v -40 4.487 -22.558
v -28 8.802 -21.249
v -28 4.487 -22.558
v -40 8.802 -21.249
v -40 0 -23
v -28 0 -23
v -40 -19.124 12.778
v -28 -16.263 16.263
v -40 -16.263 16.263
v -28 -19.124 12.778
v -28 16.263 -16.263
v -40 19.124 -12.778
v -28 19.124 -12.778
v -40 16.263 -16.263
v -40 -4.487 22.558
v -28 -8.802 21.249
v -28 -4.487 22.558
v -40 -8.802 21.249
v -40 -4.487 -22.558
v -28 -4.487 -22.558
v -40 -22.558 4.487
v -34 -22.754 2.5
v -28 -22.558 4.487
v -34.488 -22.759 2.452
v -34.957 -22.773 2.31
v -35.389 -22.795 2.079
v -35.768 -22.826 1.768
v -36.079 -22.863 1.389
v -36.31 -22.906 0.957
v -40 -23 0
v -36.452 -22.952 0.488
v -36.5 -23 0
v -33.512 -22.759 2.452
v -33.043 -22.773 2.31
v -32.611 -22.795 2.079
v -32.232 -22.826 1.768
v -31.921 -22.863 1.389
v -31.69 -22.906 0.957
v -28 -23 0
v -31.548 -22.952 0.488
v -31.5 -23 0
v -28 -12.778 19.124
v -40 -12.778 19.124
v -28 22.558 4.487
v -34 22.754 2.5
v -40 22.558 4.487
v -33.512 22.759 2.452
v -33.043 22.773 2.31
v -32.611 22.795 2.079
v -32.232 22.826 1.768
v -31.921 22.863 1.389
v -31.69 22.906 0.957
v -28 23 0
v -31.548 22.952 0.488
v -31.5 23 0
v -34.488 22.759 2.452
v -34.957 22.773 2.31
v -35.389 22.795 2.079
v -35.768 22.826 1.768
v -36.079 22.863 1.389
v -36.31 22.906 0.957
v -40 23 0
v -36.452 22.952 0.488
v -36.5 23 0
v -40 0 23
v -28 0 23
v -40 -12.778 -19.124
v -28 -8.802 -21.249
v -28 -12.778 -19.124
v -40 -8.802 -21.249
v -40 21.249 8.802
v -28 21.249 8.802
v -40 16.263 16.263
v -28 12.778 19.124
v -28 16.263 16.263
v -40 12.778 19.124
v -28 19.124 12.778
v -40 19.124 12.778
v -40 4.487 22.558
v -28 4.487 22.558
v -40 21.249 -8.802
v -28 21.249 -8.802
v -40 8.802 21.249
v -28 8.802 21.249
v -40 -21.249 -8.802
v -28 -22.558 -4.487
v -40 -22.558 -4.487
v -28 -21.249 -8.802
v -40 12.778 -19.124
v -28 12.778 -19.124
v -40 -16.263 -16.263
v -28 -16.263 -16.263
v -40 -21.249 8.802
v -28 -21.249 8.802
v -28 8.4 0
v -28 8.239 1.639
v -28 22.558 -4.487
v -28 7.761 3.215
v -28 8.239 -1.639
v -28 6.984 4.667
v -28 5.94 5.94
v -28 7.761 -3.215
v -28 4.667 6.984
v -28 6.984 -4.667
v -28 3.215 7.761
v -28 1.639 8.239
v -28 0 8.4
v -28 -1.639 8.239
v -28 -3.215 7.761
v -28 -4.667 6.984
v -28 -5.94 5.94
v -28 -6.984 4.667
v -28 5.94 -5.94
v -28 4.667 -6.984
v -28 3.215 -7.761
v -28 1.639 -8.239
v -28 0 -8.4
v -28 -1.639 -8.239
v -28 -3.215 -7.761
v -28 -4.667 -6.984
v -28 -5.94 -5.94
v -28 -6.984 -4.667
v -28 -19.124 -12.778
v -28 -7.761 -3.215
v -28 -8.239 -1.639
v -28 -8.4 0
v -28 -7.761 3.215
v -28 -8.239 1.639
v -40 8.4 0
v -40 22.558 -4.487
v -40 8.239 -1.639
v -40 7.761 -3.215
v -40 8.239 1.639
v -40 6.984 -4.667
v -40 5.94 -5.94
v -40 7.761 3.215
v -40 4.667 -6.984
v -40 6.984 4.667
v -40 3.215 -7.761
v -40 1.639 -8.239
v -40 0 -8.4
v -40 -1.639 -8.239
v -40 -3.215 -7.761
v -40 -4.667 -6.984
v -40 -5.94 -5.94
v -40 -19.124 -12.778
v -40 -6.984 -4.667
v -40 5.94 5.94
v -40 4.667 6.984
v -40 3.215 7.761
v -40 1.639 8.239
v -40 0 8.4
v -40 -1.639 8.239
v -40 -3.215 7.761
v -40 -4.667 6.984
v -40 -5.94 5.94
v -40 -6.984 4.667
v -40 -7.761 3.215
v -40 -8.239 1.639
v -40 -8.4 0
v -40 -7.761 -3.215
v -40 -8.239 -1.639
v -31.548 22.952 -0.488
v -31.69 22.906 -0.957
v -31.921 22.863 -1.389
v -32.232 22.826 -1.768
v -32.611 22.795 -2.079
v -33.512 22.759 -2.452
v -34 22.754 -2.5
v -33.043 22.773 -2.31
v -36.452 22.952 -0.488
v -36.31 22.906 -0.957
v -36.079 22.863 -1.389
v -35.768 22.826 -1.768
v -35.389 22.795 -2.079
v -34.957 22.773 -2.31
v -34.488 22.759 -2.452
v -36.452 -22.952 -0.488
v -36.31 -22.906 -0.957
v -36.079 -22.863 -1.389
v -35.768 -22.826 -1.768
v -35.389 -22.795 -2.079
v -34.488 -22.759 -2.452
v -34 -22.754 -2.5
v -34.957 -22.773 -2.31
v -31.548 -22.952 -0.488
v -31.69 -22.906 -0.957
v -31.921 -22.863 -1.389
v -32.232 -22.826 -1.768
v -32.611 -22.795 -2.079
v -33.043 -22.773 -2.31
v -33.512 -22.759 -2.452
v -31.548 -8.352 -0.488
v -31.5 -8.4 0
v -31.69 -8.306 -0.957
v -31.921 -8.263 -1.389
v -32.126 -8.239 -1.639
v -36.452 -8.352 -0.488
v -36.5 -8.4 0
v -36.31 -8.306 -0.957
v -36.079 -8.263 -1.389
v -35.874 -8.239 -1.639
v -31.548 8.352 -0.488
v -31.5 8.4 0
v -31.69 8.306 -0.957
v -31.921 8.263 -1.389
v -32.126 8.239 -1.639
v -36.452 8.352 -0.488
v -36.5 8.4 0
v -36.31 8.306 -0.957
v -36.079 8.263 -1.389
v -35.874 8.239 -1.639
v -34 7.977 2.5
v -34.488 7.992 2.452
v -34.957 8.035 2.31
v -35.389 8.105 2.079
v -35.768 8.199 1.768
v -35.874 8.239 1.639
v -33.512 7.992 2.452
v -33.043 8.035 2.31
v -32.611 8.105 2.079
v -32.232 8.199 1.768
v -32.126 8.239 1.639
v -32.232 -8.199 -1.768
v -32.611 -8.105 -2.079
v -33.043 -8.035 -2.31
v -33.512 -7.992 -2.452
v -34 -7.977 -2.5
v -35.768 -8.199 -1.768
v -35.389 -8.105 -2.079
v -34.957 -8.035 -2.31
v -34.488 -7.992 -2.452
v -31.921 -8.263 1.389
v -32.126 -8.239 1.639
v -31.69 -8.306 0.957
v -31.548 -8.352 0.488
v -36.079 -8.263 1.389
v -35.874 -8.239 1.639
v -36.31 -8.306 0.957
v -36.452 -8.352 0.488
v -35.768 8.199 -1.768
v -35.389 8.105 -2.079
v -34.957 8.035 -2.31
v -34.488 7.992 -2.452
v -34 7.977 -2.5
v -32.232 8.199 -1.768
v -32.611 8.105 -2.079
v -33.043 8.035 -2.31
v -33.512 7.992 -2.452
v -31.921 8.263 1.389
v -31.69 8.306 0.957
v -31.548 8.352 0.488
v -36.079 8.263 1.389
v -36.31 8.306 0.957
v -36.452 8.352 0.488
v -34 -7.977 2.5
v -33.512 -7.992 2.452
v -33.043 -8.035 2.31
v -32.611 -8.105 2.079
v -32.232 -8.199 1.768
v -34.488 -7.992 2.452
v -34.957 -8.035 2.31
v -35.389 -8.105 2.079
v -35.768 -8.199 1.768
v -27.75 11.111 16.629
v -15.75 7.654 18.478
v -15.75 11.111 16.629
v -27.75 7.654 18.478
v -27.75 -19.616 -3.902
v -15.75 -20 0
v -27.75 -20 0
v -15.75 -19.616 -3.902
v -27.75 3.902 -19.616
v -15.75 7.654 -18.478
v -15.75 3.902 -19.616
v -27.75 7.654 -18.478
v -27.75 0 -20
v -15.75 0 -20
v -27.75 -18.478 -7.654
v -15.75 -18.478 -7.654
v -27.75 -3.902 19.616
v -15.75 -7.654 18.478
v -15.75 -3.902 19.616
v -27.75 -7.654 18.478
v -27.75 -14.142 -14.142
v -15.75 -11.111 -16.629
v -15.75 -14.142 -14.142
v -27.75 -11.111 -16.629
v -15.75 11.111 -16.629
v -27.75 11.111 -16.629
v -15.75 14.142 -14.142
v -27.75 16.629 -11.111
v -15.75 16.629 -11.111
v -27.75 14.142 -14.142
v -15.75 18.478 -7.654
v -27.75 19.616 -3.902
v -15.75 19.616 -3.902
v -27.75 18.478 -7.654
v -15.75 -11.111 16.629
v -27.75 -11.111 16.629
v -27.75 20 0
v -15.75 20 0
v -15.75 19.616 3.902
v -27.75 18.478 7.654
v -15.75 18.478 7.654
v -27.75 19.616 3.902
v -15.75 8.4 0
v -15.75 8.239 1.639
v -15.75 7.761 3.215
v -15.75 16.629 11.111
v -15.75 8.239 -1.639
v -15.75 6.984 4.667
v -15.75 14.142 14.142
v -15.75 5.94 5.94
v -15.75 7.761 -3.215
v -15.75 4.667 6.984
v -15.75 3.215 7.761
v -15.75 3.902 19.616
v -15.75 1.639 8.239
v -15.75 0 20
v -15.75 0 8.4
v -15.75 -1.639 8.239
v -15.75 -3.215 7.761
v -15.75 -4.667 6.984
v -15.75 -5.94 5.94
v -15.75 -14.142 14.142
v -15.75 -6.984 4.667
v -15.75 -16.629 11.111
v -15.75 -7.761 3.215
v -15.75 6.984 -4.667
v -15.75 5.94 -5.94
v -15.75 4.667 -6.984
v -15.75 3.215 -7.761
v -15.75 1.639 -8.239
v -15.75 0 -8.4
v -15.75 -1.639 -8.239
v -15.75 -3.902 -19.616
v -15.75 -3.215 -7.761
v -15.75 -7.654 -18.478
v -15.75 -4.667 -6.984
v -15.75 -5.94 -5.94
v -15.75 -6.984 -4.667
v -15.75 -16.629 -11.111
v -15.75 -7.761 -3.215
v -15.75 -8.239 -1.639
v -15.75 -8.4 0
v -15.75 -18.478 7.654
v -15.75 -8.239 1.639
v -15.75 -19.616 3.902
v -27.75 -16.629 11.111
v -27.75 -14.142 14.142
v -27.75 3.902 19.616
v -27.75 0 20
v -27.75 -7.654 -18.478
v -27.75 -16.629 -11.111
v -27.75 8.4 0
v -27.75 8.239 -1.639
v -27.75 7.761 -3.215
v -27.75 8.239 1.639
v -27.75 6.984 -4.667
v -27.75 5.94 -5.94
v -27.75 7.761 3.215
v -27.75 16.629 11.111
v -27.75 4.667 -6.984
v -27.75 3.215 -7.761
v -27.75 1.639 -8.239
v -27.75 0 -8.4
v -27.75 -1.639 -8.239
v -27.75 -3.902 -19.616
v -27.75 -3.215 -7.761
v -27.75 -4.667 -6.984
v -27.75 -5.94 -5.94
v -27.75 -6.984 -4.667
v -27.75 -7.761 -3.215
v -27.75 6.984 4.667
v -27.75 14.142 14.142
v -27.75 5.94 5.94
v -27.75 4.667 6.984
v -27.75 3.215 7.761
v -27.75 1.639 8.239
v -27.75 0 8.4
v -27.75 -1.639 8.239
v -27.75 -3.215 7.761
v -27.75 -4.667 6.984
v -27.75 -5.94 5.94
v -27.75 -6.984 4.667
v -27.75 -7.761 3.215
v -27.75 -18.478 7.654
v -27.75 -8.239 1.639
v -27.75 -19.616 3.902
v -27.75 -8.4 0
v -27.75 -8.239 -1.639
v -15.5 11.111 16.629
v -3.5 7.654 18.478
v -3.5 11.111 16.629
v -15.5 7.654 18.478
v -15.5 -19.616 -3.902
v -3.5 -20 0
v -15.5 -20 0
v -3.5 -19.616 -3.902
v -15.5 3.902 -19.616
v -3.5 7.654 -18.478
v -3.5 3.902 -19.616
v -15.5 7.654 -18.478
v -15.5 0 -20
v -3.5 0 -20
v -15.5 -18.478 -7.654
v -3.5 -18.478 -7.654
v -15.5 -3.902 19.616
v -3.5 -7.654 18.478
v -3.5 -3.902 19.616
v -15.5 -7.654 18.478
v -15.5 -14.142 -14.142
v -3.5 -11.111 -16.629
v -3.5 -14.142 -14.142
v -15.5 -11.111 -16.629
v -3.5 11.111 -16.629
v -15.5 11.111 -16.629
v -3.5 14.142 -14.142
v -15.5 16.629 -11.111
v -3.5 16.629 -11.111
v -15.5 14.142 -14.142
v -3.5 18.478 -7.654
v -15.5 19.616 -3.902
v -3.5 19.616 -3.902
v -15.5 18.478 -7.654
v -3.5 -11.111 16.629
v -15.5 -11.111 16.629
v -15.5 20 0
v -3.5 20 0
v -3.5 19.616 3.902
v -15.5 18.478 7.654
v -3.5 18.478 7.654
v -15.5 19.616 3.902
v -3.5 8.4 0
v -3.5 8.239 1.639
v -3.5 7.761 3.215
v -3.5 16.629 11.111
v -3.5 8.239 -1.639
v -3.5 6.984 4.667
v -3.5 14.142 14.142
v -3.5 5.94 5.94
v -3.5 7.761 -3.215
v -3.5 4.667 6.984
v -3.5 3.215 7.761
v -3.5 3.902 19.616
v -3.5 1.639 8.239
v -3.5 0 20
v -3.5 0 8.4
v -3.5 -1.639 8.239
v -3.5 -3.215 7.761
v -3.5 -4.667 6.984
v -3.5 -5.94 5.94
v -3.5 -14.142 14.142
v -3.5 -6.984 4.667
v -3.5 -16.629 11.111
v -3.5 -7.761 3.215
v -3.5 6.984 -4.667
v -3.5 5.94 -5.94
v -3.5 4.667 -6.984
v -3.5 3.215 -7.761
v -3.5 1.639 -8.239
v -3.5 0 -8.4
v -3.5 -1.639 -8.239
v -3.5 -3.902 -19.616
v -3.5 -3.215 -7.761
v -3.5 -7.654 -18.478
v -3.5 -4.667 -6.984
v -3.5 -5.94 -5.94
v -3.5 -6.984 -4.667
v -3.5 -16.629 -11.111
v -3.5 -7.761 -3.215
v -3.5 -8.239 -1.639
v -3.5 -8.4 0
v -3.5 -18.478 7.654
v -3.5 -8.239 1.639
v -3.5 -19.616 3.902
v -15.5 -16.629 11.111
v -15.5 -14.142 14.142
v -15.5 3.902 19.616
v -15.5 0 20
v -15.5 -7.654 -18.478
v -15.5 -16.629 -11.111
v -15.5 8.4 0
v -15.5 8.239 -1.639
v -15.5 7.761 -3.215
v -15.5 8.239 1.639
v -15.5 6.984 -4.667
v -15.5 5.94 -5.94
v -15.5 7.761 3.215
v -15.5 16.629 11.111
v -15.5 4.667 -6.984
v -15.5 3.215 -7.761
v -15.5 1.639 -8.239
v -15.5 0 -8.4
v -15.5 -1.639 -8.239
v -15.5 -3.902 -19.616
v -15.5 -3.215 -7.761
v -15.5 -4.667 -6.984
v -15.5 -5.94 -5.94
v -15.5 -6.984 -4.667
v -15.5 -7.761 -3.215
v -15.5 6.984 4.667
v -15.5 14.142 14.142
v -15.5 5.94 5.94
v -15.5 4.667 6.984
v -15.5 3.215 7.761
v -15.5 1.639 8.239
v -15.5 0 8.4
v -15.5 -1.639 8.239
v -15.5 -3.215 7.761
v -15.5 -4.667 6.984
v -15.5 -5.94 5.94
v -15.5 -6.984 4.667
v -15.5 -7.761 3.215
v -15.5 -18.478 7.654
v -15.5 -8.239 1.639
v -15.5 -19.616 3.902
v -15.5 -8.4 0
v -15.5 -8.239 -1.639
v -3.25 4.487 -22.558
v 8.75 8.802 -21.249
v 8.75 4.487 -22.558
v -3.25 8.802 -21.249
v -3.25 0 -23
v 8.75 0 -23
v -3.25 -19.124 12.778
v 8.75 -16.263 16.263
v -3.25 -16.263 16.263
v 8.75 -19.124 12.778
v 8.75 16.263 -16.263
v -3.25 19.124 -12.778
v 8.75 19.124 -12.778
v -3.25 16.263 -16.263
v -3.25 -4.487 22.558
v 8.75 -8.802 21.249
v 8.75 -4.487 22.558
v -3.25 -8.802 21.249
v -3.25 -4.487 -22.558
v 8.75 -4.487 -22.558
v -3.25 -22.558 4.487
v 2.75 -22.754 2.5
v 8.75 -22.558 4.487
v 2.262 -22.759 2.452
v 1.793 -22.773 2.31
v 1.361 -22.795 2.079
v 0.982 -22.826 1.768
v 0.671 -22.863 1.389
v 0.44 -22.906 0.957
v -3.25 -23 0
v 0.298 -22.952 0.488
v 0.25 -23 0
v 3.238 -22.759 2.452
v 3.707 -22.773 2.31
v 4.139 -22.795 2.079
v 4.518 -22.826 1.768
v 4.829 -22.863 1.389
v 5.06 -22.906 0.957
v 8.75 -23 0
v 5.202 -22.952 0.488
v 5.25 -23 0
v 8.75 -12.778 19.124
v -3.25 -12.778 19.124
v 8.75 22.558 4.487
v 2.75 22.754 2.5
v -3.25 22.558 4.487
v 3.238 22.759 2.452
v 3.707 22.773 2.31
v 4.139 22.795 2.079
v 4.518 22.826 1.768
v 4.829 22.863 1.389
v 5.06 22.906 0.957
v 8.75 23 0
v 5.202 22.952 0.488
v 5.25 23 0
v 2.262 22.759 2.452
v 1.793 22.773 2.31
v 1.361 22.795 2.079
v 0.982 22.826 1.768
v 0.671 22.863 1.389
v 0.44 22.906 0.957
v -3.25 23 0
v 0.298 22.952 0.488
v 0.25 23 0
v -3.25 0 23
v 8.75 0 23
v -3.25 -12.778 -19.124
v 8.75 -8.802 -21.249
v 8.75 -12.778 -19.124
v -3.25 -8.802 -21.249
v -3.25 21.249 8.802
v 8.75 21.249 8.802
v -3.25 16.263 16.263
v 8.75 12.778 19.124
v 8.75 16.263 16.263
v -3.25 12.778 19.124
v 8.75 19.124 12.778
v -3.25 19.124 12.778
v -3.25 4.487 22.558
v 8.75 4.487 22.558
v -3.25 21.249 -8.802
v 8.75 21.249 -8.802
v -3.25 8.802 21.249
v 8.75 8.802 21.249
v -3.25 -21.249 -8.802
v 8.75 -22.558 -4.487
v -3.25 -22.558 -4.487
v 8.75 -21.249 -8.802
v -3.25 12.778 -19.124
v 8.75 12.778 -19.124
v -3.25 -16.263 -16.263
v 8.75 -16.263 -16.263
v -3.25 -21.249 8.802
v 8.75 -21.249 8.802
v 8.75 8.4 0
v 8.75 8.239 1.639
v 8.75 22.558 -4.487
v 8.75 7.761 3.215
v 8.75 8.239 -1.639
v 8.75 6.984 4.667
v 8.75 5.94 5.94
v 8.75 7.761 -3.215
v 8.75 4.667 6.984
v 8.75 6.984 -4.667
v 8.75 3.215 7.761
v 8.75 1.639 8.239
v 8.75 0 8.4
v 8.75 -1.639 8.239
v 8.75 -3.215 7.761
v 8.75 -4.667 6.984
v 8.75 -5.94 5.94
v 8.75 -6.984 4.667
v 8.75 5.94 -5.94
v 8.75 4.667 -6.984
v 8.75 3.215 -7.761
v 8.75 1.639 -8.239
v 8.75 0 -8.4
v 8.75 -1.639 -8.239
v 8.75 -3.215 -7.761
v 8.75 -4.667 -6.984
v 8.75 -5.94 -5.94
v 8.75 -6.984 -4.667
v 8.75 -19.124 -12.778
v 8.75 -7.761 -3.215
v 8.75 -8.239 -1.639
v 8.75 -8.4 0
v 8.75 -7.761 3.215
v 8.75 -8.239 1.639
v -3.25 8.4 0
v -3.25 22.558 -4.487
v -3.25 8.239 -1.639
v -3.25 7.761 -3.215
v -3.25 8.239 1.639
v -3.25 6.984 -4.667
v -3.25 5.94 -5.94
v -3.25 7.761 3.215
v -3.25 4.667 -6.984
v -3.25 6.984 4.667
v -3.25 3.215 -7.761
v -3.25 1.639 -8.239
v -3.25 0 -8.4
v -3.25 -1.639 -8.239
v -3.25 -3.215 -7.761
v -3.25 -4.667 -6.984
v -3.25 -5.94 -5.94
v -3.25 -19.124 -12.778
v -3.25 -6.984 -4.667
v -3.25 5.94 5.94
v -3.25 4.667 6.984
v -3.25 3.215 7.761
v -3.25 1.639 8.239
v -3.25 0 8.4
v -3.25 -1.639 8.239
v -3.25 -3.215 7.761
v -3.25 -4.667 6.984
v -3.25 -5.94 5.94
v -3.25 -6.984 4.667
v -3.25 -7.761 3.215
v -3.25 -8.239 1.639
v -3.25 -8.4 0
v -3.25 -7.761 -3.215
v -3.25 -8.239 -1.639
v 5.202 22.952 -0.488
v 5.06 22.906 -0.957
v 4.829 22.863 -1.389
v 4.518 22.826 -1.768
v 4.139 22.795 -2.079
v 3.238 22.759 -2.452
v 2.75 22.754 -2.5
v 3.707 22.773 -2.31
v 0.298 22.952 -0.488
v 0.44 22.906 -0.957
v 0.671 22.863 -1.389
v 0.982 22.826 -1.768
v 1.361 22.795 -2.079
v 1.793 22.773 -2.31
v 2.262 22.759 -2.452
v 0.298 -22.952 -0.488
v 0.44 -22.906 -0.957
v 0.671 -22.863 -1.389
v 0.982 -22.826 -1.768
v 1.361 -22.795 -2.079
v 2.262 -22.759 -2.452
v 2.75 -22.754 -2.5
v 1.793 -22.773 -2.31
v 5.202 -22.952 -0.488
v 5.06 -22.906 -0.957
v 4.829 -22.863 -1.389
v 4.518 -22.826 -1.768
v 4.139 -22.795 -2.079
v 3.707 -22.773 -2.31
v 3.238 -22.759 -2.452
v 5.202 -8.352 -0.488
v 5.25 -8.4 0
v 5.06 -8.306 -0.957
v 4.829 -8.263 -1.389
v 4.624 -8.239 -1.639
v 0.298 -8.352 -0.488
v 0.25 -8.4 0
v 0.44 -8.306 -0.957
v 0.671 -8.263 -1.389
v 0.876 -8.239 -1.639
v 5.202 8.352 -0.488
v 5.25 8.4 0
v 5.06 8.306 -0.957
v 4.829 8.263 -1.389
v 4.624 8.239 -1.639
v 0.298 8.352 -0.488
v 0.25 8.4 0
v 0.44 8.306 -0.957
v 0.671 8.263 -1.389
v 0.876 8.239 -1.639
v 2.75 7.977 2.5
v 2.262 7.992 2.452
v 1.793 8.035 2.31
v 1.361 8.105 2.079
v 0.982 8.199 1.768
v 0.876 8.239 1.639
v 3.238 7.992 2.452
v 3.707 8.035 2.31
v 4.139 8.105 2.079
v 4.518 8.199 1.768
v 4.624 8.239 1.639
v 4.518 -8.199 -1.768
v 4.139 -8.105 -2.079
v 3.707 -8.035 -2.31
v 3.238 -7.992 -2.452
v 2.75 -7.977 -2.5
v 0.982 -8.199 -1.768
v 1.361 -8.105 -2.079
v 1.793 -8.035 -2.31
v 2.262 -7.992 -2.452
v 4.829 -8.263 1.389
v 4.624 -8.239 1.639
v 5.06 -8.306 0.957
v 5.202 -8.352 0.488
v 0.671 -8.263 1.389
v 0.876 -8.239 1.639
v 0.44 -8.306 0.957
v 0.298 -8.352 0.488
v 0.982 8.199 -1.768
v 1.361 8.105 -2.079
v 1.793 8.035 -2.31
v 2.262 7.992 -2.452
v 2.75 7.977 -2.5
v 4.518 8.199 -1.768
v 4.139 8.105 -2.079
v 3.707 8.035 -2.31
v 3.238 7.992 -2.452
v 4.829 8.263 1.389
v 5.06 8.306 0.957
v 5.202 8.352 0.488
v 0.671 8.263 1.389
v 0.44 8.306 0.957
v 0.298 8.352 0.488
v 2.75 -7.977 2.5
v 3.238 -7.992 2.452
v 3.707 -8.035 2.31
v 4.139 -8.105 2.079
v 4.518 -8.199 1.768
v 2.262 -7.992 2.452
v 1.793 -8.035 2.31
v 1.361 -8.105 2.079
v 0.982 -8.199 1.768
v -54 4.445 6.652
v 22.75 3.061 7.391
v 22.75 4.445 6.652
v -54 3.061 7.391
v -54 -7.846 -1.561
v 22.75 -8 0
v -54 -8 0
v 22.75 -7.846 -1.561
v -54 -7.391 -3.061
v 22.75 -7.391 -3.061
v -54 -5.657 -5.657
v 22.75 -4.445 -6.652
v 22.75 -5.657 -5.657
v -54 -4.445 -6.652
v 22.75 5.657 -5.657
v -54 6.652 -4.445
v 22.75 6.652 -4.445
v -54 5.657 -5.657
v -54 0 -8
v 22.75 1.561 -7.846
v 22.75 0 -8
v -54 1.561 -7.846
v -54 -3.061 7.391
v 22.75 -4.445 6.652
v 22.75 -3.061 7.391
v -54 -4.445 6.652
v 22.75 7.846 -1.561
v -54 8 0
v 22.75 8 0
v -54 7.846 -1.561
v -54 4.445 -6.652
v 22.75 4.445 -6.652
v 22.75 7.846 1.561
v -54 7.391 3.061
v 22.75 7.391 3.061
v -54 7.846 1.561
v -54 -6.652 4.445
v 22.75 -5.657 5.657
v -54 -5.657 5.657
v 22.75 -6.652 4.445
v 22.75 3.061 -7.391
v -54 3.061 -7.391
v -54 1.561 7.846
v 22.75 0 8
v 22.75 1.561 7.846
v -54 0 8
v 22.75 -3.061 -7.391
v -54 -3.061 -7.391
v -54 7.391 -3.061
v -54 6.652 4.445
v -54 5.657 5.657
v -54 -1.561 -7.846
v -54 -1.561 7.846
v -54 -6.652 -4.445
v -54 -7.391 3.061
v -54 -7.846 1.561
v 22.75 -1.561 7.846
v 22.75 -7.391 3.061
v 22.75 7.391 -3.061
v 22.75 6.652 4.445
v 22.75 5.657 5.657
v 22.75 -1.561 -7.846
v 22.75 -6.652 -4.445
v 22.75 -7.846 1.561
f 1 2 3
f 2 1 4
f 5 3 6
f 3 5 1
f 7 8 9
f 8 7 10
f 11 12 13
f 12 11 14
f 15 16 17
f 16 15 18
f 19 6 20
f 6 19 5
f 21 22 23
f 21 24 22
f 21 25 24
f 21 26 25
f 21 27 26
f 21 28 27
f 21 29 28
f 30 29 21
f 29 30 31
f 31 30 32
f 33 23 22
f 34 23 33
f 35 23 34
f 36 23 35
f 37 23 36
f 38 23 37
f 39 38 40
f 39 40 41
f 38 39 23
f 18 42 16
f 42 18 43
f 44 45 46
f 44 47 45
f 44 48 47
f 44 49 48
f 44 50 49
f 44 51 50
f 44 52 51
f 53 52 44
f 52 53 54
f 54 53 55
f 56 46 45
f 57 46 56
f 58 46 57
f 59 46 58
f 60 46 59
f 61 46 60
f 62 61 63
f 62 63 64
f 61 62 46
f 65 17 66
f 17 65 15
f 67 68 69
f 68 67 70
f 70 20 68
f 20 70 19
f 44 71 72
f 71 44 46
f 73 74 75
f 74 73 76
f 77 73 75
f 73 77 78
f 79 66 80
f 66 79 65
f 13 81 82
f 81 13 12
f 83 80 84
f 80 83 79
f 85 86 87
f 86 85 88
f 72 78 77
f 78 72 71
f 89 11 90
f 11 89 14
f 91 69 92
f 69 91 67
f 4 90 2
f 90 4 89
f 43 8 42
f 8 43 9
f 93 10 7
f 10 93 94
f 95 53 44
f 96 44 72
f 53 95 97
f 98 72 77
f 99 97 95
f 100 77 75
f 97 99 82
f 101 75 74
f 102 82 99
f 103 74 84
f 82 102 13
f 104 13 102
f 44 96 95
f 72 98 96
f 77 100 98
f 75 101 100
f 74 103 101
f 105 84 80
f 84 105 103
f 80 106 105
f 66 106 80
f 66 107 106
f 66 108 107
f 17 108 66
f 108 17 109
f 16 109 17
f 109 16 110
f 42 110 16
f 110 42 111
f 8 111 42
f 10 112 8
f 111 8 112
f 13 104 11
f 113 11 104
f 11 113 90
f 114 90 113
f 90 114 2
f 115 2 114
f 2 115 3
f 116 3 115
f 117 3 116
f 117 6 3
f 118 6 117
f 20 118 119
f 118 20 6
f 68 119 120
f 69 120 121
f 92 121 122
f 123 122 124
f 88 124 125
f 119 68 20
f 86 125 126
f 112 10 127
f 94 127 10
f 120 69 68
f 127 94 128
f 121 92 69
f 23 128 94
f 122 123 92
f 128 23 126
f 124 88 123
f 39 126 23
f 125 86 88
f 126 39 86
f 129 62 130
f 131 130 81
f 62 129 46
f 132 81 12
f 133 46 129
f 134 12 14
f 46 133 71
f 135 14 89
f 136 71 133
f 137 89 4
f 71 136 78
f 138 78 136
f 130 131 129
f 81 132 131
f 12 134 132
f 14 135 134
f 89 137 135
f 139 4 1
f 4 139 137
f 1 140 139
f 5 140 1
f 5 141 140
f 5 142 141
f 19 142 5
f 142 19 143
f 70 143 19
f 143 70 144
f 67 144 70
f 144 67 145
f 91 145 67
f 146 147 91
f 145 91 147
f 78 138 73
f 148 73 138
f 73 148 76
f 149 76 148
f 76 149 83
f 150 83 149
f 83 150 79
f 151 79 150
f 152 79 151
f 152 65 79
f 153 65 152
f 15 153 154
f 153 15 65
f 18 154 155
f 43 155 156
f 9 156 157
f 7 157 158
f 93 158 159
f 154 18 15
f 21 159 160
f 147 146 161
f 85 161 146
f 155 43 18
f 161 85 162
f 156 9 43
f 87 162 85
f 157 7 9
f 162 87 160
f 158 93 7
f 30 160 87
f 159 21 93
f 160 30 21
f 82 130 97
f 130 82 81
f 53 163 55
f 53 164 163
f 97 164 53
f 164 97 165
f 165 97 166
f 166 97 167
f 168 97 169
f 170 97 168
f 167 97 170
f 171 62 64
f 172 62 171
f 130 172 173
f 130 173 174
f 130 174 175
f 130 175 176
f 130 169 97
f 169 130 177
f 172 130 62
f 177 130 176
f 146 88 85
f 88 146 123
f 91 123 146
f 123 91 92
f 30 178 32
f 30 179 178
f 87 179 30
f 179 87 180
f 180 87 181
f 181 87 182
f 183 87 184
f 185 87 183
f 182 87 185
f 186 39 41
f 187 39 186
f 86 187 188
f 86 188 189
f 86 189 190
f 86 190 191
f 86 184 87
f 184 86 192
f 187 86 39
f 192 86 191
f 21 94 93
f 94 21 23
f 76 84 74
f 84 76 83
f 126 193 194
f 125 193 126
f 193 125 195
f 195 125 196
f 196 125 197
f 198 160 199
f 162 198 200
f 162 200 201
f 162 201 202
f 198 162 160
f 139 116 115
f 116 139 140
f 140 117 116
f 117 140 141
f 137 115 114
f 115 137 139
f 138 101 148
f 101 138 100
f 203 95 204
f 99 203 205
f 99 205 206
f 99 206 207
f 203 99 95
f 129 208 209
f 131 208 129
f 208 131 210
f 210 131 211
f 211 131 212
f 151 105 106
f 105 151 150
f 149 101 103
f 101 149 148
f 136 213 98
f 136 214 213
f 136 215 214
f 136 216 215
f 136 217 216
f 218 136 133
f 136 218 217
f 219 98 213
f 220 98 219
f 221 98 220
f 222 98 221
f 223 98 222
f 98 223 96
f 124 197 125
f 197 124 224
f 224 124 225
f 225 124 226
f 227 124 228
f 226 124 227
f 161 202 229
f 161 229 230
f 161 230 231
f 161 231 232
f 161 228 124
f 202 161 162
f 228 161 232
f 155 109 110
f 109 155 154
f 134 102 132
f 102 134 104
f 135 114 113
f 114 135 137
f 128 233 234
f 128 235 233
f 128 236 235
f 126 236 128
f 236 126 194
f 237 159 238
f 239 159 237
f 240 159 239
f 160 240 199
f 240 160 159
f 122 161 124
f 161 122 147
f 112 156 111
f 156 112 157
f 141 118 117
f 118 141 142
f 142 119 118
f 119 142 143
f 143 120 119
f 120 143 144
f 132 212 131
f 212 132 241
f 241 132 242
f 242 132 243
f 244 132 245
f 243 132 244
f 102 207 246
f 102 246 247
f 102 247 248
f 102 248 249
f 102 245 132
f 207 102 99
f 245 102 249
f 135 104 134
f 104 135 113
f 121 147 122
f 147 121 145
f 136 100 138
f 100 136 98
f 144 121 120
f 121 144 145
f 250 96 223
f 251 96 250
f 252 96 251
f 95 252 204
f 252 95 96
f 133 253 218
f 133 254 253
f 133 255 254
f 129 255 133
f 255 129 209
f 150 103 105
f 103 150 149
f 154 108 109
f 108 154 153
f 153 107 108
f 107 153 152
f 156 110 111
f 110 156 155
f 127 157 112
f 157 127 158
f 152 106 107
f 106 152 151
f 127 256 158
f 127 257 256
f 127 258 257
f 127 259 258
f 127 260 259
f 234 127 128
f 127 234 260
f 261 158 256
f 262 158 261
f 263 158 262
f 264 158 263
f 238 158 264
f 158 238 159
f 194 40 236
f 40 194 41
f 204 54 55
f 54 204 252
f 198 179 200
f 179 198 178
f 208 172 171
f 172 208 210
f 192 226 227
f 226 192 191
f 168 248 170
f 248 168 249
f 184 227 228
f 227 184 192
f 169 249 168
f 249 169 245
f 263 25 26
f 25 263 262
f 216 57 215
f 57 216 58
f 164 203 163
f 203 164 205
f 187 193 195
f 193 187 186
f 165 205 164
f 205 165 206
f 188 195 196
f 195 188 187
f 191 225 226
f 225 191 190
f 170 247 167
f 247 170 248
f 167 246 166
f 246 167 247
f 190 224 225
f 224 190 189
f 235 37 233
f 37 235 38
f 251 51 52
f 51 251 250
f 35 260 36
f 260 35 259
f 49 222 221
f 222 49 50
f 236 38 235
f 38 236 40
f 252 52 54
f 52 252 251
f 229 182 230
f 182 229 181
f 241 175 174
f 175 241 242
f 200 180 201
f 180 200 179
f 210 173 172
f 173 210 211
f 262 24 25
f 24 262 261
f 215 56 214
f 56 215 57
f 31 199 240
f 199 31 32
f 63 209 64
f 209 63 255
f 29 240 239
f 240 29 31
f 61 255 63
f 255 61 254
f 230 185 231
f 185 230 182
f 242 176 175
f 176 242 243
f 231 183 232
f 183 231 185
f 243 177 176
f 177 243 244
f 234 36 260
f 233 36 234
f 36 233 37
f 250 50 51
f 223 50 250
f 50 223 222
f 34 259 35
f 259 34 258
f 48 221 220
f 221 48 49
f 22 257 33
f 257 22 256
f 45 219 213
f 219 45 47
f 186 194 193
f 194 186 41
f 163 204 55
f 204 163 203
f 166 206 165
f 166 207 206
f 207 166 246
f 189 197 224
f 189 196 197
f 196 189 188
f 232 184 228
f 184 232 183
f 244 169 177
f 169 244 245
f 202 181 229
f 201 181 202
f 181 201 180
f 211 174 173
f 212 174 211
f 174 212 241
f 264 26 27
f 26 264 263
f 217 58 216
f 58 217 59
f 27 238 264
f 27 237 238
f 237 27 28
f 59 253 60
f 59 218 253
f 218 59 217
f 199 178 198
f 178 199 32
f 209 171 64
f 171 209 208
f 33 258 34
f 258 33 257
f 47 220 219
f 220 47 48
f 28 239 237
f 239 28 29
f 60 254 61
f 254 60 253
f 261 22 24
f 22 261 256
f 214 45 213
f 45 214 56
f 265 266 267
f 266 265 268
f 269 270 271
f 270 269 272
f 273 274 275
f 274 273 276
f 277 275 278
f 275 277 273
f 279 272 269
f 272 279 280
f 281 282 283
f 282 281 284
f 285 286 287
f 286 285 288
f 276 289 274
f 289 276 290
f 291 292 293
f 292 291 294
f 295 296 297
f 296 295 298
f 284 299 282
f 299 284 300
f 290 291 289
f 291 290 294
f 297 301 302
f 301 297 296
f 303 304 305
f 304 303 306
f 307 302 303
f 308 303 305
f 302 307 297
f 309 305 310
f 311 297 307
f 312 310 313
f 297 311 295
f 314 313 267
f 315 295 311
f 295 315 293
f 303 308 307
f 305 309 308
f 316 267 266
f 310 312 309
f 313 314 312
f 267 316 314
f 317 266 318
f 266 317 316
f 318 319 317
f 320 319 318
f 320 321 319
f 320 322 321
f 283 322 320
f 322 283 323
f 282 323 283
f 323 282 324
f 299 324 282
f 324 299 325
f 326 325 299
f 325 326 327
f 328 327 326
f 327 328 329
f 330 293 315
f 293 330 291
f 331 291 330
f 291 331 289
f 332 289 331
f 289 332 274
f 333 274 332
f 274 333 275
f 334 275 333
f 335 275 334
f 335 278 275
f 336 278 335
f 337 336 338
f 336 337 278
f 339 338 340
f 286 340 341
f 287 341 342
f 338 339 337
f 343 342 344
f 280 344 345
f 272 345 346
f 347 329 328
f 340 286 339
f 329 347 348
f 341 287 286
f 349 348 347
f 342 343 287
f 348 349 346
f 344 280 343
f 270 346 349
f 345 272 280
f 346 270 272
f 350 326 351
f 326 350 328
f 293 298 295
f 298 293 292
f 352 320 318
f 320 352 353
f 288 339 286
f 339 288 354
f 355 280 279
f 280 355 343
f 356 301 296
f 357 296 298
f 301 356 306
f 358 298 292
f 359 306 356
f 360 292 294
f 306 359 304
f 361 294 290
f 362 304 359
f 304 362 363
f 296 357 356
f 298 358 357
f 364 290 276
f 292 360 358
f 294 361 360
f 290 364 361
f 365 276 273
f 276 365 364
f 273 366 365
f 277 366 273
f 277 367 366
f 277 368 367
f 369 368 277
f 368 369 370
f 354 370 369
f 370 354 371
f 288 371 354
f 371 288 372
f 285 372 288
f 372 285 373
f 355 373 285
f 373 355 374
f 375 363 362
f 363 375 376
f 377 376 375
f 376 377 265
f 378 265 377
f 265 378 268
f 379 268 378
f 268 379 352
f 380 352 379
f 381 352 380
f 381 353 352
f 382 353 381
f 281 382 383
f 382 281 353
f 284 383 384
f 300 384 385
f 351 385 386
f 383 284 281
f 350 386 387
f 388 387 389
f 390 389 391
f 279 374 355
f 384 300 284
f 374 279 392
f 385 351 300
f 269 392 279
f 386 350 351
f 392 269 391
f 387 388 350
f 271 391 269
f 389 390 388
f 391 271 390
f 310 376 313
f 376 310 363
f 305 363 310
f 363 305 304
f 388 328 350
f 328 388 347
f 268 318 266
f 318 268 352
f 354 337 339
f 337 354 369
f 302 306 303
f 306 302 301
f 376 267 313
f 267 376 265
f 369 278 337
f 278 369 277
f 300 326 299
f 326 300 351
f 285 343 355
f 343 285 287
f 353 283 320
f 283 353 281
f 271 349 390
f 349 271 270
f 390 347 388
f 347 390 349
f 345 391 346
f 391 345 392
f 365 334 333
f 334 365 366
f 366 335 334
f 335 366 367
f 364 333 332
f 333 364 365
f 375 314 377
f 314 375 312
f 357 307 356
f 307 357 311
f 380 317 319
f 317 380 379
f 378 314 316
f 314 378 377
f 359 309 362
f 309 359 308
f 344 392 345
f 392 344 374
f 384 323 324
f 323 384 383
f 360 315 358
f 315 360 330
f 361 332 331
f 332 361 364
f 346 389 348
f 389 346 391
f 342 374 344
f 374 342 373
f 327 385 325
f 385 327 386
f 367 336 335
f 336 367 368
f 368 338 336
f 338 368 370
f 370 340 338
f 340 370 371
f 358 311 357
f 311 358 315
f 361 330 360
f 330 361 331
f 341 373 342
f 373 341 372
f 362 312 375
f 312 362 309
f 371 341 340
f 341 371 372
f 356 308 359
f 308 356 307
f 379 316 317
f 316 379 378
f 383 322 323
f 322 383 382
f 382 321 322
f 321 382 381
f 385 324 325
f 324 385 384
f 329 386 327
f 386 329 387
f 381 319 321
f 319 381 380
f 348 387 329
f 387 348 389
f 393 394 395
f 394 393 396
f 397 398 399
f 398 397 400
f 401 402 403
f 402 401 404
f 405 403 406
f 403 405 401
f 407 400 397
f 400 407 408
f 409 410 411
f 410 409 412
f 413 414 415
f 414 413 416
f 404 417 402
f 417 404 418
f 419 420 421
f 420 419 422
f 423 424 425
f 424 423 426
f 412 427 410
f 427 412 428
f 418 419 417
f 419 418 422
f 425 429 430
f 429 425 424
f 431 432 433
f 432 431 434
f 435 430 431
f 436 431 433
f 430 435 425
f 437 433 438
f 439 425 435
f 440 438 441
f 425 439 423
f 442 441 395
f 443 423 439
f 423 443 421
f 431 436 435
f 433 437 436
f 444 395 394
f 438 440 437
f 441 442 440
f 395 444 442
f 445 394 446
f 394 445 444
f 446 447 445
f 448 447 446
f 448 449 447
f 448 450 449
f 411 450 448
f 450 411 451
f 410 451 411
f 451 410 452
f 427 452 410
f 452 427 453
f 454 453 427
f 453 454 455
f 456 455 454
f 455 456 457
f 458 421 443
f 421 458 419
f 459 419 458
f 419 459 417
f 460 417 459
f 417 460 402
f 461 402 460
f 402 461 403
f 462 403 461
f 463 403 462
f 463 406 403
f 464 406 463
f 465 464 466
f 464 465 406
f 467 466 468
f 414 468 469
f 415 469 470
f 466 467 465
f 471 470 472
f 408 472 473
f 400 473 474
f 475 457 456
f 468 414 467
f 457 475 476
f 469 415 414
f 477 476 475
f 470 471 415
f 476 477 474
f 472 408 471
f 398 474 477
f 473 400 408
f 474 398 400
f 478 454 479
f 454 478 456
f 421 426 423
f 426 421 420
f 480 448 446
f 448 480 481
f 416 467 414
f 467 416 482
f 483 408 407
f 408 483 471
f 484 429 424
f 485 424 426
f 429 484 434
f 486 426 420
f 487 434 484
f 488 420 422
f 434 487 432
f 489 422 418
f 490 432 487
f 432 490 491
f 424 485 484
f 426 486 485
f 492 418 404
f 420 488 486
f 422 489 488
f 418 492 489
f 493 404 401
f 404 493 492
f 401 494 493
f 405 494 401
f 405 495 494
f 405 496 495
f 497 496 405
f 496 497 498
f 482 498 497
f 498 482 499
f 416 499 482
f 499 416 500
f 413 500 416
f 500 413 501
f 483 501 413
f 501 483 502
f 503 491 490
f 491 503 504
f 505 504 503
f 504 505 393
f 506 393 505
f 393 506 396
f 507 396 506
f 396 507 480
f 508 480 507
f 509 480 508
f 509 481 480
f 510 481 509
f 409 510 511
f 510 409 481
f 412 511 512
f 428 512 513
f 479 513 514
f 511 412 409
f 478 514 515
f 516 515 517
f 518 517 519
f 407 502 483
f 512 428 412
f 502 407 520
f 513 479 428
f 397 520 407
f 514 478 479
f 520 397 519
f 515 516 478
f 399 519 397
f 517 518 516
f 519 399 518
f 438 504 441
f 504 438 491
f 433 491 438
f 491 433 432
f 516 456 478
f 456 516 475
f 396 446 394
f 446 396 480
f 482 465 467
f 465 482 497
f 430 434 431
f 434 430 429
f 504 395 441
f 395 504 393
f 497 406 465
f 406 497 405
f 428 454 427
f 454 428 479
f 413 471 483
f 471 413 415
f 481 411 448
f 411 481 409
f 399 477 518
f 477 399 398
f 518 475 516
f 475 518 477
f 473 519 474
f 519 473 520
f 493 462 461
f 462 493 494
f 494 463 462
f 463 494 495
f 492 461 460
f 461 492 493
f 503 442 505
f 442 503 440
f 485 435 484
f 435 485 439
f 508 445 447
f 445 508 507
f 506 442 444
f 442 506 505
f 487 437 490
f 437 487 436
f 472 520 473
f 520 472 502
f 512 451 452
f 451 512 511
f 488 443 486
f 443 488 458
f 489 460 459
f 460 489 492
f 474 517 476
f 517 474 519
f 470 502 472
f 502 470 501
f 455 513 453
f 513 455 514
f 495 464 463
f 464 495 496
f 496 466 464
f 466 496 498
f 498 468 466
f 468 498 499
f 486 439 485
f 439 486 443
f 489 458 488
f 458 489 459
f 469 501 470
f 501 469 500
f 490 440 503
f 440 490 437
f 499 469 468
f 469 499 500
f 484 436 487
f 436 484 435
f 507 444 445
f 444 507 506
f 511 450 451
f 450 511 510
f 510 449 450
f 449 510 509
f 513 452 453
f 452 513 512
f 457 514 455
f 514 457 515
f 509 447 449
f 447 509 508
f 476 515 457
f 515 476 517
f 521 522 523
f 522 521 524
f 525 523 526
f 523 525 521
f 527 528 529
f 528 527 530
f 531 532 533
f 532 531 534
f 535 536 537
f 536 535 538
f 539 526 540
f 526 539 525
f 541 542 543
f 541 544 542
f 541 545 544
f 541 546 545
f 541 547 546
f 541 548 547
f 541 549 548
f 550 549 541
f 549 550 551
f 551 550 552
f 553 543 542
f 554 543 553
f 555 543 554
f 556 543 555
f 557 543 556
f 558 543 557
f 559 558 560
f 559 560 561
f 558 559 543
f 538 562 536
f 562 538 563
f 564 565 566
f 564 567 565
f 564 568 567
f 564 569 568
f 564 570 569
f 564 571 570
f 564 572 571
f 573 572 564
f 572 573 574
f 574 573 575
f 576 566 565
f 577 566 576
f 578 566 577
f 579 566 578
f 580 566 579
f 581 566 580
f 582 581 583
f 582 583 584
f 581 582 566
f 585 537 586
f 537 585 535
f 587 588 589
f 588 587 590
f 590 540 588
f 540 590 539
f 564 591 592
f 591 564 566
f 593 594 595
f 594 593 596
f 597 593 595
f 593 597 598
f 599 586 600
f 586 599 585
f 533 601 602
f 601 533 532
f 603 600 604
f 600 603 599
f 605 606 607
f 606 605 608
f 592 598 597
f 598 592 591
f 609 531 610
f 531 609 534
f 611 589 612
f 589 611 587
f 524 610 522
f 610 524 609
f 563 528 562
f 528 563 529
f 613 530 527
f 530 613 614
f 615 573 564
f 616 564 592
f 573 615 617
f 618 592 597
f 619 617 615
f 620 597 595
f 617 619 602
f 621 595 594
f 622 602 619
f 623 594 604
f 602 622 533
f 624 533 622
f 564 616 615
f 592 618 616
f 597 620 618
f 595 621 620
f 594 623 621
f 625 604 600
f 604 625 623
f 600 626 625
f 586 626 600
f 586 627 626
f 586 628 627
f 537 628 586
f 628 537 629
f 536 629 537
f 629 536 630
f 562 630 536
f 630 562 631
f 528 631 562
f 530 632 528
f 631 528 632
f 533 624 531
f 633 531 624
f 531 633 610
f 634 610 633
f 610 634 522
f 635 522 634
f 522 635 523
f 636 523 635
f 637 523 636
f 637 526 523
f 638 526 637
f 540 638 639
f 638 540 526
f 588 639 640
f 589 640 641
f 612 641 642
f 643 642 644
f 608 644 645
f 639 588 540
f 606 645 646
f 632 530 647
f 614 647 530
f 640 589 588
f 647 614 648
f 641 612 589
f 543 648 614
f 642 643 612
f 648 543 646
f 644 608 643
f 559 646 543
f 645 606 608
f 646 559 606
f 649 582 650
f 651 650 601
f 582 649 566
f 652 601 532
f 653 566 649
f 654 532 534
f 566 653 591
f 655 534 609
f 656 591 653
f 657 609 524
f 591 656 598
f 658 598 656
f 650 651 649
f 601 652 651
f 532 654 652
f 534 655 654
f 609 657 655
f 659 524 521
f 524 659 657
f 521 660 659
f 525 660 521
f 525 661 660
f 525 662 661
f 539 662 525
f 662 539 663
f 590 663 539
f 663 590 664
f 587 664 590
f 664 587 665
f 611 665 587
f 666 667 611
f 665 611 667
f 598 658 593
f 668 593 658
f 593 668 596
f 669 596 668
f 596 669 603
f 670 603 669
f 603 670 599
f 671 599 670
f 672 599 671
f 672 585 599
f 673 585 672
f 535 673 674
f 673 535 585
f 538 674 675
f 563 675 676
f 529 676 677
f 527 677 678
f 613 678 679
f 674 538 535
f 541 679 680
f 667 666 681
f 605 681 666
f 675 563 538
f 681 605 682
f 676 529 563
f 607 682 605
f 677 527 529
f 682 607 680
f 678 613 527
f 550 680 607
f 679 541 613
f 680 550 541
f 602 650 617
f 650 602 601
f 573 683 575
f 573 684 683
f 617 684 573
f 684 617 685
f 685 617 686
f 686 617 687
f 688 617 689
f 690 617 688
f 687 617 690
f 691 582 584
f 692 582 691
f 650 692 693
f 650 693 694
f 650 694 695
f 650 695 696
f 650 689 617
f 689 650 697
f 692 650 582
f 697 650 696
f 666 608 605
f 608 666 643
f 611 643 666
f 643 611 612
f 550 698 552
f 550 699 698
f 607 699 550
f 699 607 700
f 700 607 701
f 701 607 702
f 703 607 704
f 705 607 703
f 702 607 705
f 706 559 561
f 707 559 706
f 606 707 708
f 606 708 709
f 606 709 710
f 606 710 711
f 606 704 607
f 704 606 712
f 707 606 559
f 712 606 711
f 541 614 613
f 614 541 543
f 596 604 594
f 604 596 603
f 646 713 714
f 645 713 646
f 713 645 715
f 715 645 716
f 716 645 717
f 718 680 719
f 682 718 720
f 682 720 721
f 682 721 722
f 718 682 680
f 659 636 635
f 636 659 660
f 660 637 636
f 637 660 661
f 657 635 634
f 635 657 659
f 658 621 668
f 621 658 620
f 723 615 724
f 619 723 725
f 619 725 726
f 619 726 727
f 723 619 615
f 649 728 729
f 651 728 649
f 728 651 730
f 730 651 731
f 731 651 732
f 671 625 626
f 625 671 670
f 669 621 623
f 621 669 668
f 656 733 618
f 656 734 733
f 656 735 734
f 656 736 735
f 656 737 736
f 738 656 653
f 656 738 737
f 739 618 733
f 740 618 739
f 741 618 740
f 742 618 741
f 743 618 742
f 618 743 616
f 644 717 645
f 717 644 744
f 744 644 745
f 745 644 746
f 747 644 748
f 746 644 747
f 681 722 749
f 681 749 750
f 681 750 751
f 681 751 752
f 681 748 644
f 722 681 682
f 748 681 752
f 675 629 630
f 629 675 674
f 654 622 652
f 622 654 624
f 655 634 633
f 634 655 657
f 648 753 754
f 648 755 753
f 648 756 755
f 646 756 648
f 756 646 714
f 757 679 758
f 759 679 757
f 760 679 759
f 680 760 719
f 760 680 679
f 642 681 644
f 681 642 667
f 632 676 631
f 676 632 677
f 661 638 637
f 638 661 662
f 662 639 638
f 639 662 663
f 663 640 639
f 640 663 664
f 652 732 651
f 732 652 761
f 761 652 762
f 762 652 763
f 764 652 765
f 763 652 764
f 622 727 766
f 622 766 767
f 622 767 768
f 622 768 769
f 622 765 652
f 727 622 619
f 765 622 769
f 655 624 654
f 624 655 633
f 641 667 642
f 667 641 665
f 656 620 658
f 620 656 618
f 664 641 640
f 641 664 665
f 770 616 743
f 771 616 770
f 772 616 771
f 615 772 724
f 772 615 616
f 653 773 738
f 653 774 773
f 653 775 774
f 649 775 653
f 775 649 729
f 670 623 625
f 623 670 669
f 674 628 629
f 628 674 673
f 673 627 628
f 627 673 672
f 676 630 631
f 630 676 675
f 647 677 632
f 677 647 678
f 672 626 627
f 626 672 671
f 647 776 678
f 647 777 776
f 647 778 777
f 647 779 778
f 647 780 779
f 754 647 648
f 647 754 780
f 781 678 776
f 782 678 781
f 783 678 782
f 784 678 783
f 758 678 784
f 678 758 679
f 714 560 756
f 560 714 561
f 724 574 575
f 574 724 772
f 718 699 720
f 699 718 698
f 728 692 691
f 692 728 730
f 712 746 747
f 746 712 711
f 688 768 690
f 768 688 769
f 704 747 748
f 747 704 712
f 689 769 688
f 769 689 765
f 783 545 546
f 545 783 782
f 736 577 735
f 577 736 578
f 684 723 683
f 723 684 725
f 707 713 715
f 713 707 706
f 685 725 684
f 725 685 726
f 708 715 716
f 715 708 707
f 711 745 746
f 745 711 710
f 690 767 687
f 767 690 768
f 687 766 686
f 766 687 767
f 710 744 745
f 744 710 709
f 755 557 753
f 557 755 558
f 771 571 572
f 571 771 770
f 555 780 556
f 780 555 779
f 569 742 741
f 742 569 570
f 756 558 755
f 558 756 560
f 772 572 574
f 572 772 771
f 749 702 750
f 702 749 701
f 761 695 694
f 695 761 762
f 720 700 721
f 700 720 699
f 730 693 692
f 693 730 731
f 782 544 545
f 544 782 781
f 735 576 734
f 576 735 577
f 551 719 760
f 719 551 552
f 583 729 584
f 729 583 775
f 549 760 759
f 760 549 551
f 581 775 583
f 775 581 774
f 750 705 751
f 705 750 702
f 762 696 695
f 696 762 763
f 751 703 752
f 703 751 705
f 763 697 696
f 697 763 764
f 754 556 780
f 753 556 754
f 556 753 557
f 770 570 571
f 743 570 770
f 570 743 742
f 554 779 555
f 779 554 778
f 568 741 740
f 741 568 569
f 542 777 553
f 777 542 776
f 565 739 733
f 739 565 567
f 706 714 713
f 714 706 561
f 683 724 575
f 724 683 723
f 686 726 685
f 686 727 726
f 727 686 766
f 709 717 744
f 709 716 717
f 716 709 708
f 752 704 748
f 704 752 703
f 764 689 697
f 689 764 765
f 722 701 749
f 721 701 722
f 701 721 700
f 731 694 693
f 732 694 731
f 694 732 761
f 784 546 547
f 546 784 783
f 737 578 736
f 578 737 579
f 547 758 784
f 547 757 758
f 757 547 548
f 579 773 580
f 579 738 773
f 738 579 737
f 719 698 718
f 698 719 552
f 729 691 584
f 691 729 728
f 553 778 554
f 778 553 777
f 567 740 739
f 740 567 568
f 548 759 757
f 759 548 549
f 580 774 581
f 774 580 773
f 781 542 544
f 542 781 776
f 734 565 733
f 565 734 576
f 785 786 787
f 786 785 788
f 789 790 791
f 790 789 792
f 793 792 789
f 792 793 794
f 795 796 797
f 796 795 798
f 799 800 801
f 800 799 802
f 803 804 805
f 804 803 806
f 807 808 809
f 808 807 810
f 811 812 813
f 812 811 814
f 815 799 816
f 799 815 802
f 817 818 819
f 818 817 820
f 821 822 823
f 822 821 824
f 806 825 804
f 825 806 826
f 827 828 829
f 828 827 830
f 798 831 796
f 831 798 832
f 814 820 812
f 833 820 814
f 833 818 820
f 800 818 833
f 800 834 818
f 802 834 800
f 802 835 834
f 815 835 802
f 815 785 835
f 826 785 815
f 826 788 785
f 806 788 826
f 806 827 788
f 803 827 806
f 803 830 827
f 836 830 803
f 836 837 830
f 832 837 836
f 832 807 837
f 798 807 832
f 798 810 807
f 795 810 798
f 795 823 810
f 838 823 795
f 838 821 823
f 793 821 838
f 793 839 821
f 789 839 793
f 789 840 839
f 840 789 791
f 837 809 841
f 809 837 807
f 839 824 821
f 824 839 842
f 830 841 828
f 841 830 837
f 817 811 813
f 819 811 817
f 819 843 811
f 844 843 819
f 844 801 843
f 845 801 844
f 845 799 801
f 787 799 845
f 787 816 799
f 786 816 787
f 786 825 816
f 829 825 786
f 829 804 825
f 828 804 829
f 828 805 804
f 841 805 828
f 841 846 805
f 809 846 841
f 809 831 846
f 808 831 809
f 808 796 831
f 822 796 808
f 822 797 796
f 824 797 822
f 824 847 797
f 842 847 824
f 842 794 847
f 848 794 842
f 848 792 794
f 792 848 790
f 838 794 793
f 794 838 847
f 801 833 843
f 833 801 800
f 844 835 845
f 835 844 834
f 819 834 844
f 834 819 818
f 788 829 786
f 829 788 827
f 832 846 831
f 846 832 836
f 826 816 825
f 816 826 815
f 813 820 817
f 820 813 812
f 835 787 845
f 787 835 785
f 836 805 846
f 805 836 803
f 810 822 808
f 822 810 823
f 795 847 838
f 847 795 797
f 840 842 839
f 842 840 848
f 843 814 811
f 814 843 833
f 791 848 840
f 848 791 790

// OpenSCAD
$fn = 32;

// ------------------------------------------------------------------------
// Shaft with rings and collars: d16 shaft, 4 rings
// Every part is its own module, assembly() places them once.
// ------------------------------------------------------------------------

// --- part 1 ---
module shaft() {
  translate([0, 0, -38.375]) cylinder(h = 76.75, d = 16);
}

// --- part 2 ---
module collar_a() {
  difference() {
    cylinder(h = 12, d = 46);
    translate([0, 0, -1]) cylinder(h = 14, d = 16.8);
    translate([0, 0, 6]) rotate([90, 0, 0]) cylinder(h = 48, d = 5, center = true);
  }
}

// --- part 3 ---
module spacer_a() {
  difference() {
      translate([0, 0, 0]) cylinder(h = 12, d = 40);
      translate([0, 0, -1]) cylinder(h = 14, d = 16.8);
    }
}

// --- part 4 ---
module spacer_b() {
  difference() {
      translate([0, 0, 0]) cylinder(h = 12, d = 40);
      translate([0, 0, -1]) cylinder(h = 14, d = 16.8);
    }
}

// --- part 5 ---
module collar_b() {
  difference() {
    cylinder(h = 12, d = 46);
    translate([0, 0, -1]) cylinder(h = 14, d = 16.8);
    translate([0, 0, 6]) rotate([90, 0, 0]) cylinder(h = 48, d = 5, center = true);
  }
}

// --- assembly ---
module assembly() {
  translate([-15.625, 0, 0]) rotate([0, 90, 0]) shaft();
  translate([-40, 0, 0]) rotate([0, 90, 0]) collar_a();
  translate([-27.75, 0, 0]) rotate([0, 90, 0]) spacer_a();
  translate([-15.5, 0, 0]) rotate([0, 90, 0]) spacer_b();
  translate([-3.25, 0, 0]) rotate([0, 90, 0]) collar_b();
}

assembly();
